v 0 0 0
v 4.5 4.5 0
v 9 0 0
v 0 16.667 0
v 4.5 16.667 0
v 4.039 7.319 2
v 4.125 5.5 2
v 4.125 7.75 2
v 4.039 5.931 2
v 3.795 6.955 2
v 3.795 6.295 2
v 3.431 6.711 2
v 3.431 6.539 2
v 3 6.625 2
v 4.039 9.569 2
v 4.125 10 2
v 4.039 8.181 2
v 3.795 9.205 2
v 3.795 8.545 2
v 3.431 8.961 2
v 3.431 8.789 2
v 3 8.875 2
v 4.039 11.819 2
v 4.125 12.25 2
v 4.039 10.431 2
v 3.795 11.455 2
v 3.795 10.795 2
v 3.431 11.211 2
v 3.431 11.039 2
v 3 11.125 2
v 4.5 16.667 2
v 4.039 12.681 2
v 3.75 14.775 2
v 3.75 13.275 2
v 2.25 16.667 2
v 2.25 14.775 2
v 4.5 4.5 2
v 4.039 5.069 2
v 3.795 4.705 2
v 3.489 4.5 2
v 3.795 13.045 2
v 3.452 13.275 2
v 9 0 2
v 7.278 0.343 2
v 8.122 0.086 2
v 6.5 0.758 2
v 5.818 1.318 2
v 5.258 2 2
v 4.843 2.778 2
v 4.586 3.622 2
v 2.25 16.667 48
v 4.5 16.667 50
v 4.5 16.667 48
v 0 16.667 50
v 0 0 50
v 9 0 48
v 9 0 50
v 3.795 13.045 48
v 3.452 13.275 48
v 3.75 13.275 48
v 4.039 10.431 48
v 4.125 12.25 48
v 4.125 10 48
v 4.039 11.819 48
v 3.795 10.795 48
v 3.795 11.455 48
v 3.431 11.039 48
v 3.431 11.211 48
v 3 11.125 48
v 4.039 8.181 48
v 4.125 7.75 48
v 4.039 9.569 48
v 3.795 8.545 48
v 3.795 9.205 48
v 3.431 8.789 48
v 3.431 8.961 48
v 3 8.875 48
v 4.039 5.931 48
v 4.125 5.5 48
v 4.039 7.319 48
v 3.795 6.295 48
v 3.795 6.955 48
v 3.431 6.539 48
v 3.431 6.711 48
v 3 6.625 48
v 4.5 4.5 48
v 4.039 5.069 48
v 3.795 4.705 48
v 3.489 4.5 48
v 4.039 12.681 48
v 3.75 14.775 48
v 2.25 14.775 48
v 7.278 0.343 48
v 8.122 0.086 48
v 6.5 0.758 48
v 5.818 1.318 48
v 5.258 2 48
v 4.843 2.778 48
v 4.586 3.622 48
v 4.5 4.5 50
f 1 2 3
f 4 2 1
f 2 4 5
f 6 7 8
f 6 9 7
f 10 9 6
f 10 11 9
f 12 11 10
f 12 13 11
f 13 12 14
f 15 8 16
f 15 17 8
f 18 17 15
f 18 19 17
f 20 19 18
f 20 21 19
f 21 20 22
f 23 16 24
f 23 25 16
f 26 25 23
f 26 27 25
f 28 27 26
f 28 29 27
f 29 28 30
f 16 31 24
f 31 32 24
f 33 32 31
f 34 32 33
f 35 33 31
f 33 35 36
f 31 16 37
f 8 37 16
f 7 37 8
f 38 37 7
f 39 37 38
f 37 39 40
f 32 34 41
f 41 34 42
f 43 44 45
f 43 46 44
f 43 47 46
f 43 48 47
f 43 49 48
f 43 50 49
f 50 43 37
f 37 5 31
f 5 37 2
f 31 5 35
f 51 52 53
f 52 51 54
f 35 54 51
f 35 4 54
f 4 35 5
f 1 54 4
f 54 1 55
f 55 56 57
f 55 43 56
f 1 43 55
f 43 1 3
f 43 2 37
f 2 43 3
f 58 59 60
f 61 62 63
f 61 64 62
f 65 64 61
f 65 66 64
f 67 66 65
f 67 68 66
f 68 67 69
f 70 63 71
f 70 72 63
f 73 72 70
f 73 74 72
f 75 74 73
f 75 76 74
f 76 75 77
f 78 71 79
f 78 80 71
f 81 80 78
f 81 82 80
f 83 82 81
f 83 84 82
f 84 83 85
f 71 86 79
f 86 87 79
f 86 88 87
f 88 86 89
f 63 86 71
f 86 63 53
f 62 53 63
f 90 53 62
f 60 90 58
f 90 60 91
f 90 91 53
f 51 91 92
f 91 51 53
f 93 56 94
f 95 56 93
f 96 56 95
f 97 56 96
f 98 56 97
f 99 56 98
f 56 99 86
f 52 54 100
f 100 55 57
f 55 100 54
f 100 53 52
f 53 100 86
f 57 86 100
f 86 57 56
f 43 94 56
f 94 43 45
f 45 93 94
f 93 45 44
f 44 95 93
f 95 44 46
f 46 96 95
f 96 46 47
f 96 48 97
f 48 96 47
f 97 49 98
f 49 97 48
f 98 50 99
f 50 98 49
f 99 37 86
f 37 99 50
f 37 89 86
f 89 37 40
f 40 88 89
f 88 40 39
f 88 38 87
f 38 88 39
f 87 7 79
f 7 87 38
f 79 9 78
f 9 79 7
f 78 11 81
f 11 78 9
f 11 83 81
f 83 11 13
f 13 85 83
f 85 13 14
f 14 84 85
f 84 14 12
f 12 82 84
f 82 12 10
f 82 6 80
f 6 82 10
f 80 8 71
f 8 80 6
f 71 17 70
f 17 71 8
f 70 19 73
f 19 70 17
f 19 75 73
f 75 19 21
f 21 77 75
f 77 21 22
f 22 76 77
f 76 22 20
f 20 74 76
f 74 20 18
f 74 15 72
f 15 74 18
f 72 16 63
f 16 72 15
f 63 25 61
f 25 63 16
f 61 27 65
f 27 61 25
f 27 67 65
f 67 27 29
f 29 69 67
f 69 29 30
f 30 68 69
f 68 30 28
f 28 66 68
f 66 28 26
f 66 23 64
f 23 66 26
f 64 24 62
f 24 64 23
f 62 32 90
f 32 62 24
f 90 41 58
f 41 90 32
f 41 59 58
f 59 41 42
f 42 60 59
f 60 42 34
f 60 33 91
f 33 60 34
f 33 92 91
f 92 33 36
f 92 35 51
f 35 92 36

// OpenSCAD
// file: ../../girl/girl_lock.scad
// Copyright 2025 Natalie Baker // Apache v2 //

include<girl_common.scad>;

girl_lock();

//color("blue")
//translate([0,0,-1]) 
//girl_slot();

module girl_lock(center=true) {
	$fn=24;
	linear_extrude(lock_height, center=center, convexity=2)
	mirror_copy([0,1])
	mirror_copy([1,0])
	_girl_lock_part();
}

module girl_slot(center=true) {
	$fn=24;
	linear_extrude(lock_height+0.2, center=center, convexity=2)
	mirror_copy([0,1])
	mirror_copy([1,0])
	_girl_slot_part();
}

module _girl_slot_part() {
	polygon([
		[           0,      0.00],
		[lock_width/2+0.30, 0.00],
		[lock_width/2+0.30, lock_shoulder+0.2],
		[lock_width/2-0.45, lock_shoulder+0.2],
		[lock_width/2-0.75, 2.80],
		[lock_width/2-0.55, lock_depth],
		[lock_width/2+0.50, lock_depth],
		[lock_width/2+0.50, 8.25],
		[lock_width/2-5.00, 8.25],
		[lock_width/2-4.70, 2.75],
		[lock_width/2-5.00, 2.30],
		[           0,      2.30],
	]);
}

module _girl_lock_part() {
	difference() {
		polygon([
			[           0,      0.00],
			[lock_width/2,      0.00],
			[lock_width/2,      lock_shoulder],
			[lock_width/2-0.95, lock_shoulder],
			[lock_width/2-0.60, lock_depth+0.1],
			[lock_width/2,      lock_depth+0.1],
			[lock_width/2-0.30, 6.20],
			[lock_width/2-2.15, 7.65],
			[lock_width/2-2.60, 7.90],
			[lock_width/2-3.00, 8.00],
			[lock_width/2-3.40, 7.90],
			[lock_width/2-3.60, 7.70],
			[lock_width/2-3.70, 7.45],
			[lock_width/2-3.25, 2.00],
			[           0,      2.00],
		]);
		polygon([
			[lock_width/2-2.10, 1.00],
			[lock_width/2-1.60, 5.50],
			[lock_width/2-2.50, 6.50],
			[lock_width/2-2.20, 1.00],
		]);
	}
}

module mirror_copy(m) {
	mirror(m) children();
	children();	
}
// file: ../../girl/girl_baseplate.scad
// Copyright 2025 Natalie Baker // Apache v2 //

include<girl_common.scad>;
use<girl_lock.scad>;

girl_baseplate_map([[1,1,1],[1,1,1],[1,1,1]]);

module girl_baseplate_map(m, brim=0.2) {
	
	// TODO interior corners

	for(y = [0:len(m)-1]) {
		for(x = [0:len(m[y])-1]) {
			translate([x*grid_size, y*grid_size])
			if (m[y][x]) {
				girl_baseplate_single(
					m[y][x+1] != 1,
					m[y+1][x] != 1,
					m[y][x-1] != 1,
					m[y-1][x] != 1,
					brim
				);
			}
		}
	}
	
	if (len(m) > 1 && len(m[y]) > 1) {
		for(y = [1:len(m)-1]) {
			for(x = [1:len(m[y])-1]) {
				
				solid_pxpy = m[y  ][x  ] == 1;
				solid_pxny = m[y-1][x  ] == 1;
				solid_nxpy = m[y  ][x-1] == 1;
				solid_nxny = m[y-1][x-1] == 1;
				
				if ((solid_pxpy && solid_nxny) && (!solid_pxny && !solid_nxpy)) {
					translate([(x-0.5)*grid_size, (y-0.5)*grid_size])
					rotate([0,0,-45])
					linear_extrude(grid_height)
					square([frame_size*2, lock_depth*2], center=true);
				}
				
				if ((!solid_pxpy && !solid_nxny) && (solid_pxny && solid_nxpy)) {
					translate([(x-0.5)*grid_size, (y-0.5)*grid_size])
					rotate([0,0,45])
					linear_extrude(grid_height)
					square([frame_size*2, lock_depth*2], center=true);
				}
			}
		}
	}
	
}

module girl_baseplate_single(x_p, y_p, x_n, y_n, brim) {
	$fn=24;
	intersection() {
		union() {
			difference() {
				_girl_baseplate_inner();
				if (x_p) _girl_baseplate_edge(270);
				if (x_n) _girl_baseplate_edge(90);
				if (y_p) _girl_baseplate_edge(0);
				if (y_n) _girl_baseplate_edge(180);
			}
			if (x_p) _girl_baseplate_edge_slots(270);
			if (x_n) _girl_baseplate_edge_slots(90);
			if (y_p) _girl_baseplate_edge_slots(0);
			if (y_n) _girl_baseplate_edge_slots(180);
		}
		
		x1 = x_n ? -grid_size/2 : -grid_size/2 - lock_depth/2;
		x2 = x_p ?  grid_size/2 :  grid_size/2 + lock_depth/2;
		y1 = y_n ? -grid_size/2 : -grid_size/2 - lock_depth/2;
		y2 = y_p ?  grid_size/2 :  grid_size/2 + lock_depth/2;
			
		linear_extrude(grid_height+100, convexity=2)
		offset( lock_depth/2)
		offset(-lock_depth/2)
		translate([x1, y1])
		square([x2-x1,y2-y1]);
	}
	
	if (brim > 0) {
		if (x_p && y_p)
			translate([grid_size/2,grid_size/2])
			_girl_baseplate_brim_ear(brim);
		
		if (x_n && y_p)
			translate([-grid_size/2,grid_size/2])
			rotate(90)
			_girl_baseplate_brim_ear(brim);
		
		if (x_n && y_n)
			translate([-grid_size/2,-grid_size/2])
			rotate(180)
			_girl_baseplate_brim_ear(brim);
		
		if (x_p && y_n)
			translate([grid_size/2,-grid_size/2])
			rotate(270)
			_girl_baseplate_brim_ear(brim);
	}
}

module _girl_baseplate_brim_ear(h, d = 16) {
	linear_extrude(h)
	difference() {
		union() {
			circle(d=d);
			polygon([
				[      0, -d*0.75+0.1],
				[   0.75, -d*0.75],
				[    d/2,       0],
				[      0,     d/2],
				[-d*0.75,    0.75],
				[-d*0.75+0.1,   0],
			]);
		}
		translate([-d/2-1,-d/2-1]) square(d/2);
	}
}

module _girl_baseplate_edge(a) {
	rotate(a)
	translate([0,grid_size/2,0])
	difference() {
		translate([-grid_size/2,-lock_depth,0])
			cube([grid_size, lock_depth, grid_height]);
		children();
	}
}

module _girl_baseplate_edge_slots(a) {
	_girl_baseplate_edge(a) {
		translate([-grid_size/4,0, grid_height/2]) girl_slot();
		translate([ grid_size/4,0, grid_height/2]) girl_slot();
	}
}

module _girl_baseplate_inner() {
	difference() {
		linear_extrude(grid_height) {
			
			repeat([grid_size, grid_size,1], 2, 2, 1, true) 
				_girl_baseplate_lattice(grid_size, frame_size, magnet_dia/3*2);
			
			rotate_copy(90)
			mirror_copy([1,0])
			translate([grid_size/4, 0])
			resize([grid_size/4, lock_depth+1.5*grid_key_width]) 
			circle(r=grid_size, $fn=32);
			
		}
		
		_girl_baseplate_magnet_slot();
		_girl_baseplate_tile_key(grid_key_width, 0.4, 0.8);
	}

	translate([0,0,grid_height])
		_girl_baseplate_tile_key(grid_key_width);
}

module _girl_baseplate_magnet_slot(tolerance=0.15) {
	mad_d = magnet_dia+2*tolerance;
	mag_h = magnet_height+2*tolerance;
	
	translate([0,0,-tolerance])
		cylinder(d=3.2, h=grid_height-magnet_height+2*tolerance);
	
	translate([0,0,grid_height-magnet_height])
		cylinder(d=mad_d, h=mag_h);
}

module _girl_baseplate_lattice(size, wall, radius) {
	intersection() {
		offset(-radius)
		offset( radius)
		difference() {
			square(size*26, center=true);
			square(size-wall, center=true);
		}
		square(size, center=true);
	}
}

module _girl_baseplate_tile_key(wall, tolerance=0, profile_tolerance=-1) {
	rotate_copy(90)
	mirror_copy([1,0])
	translate([grid_size/4,0,0])
		_girl_baseplate_tile_key_single(wall, tolerance, profile_tolerance);
}

module _girl_baseplate_tile_key_single(wall, tolerance=0, profile_tolerance=-1) {
	profile_tolerance = profile_tolerance < 0 ? tolerance : profile_tolerance;
	
	rotate([90,0,0])
	translate([0,0,-wall/2-tolerance])
	linear_extrude(wall+2*tolerance)
	offset(profile_tolerance)
	polygon([
		[ 0.00,-0.25],
		[ 3.00,-0.25],
		[ 2.00, 1.00],
		[-2.00, 1.00],
		[-3.00,-0.25]
	]);
}
// file: ../../girl/girl_tile.scad
// Copyright 2025 Natalie Baker // Apache v2 //

include<girl_common.scad>;
use<girl_baseplate.scad>;

girl_tile(1);

module girl_tile(size = 1) {

	$fn=24;

	x = is_num(size) ? size : size[0];
	y = is_num(size) ? size : size[1];
	grid_key_width_tol = 0.4;

	difference() {
		union() {
			top_height = max(1.5, tile_height/4);
			translate([0,0,tile_height-top_height]) 
			linear_extrude(top_height) 
			square([grid_size*x,grid_size*y], center=true);

			linear_extrude(tile_height, convexity=2) 
			repeat([grid_size, grid_size, 1], x, y, 1, true) 
				repeat([grid_size/2, grid_size/2, 1], 2, 2, 1, true)
					_girl_baseplate_lattice(
						grid_size/2,
						max(grid_key_width+grid_key_width_tol+1.2, frame_size/4*3),
						magnet_dia/3*2
					);
		}

		translate([0,0,-0.1]) 
		linear_extrude(magnet_height+0.1) 
		repeat([grid_size, grid_size, 1], x, y, 1, true) {
			circle(d=magnet_dia+0.2);
		}
		
		repeat([grid_size, grid_size, 1], x, y, 1, true) {
			_girl_baseplate_tile_key(grid_key_width, grid_key_width_tol, 0.8);
		}
	}

}
// file: ../../girl/girl_common.scad
// Copyright 2025 Natalie Baker // Apache v2 //

base_size  = 32;
wall_width =  9;

magnet_dia    = 6.2;
magnet_height = 2.8;

lock_height   = 1.9;
lock_depth    = 4.9;
lock_shoulder = 2.0;
lock_width    = 11;

grid_size   = base_size + 2*wall_width;
grid_diag   = sqrt(2*grid_size*grid_size);
grid_height = max(lock_height, magnet_height)+1.2;
grid_key_width = 1.6;

tile_height        = grid_height;
tile_top_thickness = tile_height-magnet_height;

frame_size = lock_depth;

module mirror_copy(m) {
	mirror(m) children();
	children();	
}

module rotate_copy(a) {
	rotate(a) children();
	children();	
}

module repeat(size, x, y, z, center) {
	off = center 
		? [(x-1)*size[0],(y-1)*size[1],(z-1)*size[2]]/2 
		: [0,0,0];

	for(i = [0 : x-1])
	for(j = [0 : y-1])
	for(k = [0 : z-1])
		translate([
			size[0]*i-off[0],
			size[1]*j-off[1],
			size[2]*k-off[2]
		]) children();
}
// main file
// Copyright 2025 Natalie Baker // Apache v2 //

include<../../girl/girl_common.scad>;
use<../../girl/girl_tile.scad>;

_scifi_wall_pipes();

module _scifi_wall_pipes(size = [grid_size, grid_size/3, wall_width], door_offset) {
	
	w = size[0];
	h = size[1];
	d = size[2];	
	
	_scifi_wall_pipes_end(d, h, 2);
	
	translate([0, 0, w-2]) 
		_scifi_wall_pipes_end(d, h, 2);

	linear_extrude(w) {
		_scifi_wall_pipes_back(d, h);
		_scifi_wall_pipes_slope(d);
		_scifi_wall_pipes_back(d, h);
		
		translate([d/3, d/2+1]) 
			_scifi_wall_pipes_part(d);
		
		translate([d/4, d/4*5.9]) 
			_scifi_wall_pipes_ledge(d);
	}
}

module _scifi_wall_pipes_ledge(d) {
	square([d/6, d/6]);
}

module _scifi_wall_pipes_slope(d) {
	difference() {
		square([d, d/2]);
		translate([d, d/2]) circle(d=d, $fn=32);
	}
}

module _scifi_wall_pipes_part(d) {
	
	repeat([1,d/4,1], 1, 4, 1) {
		translate([-d/8, -d/8]) square([d/8, d/4]);
		circle(d=d/4, $fn=16);
	}
	
}

module _scifi_wall_pipes_back(d, h) {
	square([d/4, h]);
}

module _scifi_wall_pipes_end(d, h, t) {
	linear_extrude(2) {
		polygon([[0, 0], [d, 0], [0, d]]);
		square([d/2, h]);
	}
}
